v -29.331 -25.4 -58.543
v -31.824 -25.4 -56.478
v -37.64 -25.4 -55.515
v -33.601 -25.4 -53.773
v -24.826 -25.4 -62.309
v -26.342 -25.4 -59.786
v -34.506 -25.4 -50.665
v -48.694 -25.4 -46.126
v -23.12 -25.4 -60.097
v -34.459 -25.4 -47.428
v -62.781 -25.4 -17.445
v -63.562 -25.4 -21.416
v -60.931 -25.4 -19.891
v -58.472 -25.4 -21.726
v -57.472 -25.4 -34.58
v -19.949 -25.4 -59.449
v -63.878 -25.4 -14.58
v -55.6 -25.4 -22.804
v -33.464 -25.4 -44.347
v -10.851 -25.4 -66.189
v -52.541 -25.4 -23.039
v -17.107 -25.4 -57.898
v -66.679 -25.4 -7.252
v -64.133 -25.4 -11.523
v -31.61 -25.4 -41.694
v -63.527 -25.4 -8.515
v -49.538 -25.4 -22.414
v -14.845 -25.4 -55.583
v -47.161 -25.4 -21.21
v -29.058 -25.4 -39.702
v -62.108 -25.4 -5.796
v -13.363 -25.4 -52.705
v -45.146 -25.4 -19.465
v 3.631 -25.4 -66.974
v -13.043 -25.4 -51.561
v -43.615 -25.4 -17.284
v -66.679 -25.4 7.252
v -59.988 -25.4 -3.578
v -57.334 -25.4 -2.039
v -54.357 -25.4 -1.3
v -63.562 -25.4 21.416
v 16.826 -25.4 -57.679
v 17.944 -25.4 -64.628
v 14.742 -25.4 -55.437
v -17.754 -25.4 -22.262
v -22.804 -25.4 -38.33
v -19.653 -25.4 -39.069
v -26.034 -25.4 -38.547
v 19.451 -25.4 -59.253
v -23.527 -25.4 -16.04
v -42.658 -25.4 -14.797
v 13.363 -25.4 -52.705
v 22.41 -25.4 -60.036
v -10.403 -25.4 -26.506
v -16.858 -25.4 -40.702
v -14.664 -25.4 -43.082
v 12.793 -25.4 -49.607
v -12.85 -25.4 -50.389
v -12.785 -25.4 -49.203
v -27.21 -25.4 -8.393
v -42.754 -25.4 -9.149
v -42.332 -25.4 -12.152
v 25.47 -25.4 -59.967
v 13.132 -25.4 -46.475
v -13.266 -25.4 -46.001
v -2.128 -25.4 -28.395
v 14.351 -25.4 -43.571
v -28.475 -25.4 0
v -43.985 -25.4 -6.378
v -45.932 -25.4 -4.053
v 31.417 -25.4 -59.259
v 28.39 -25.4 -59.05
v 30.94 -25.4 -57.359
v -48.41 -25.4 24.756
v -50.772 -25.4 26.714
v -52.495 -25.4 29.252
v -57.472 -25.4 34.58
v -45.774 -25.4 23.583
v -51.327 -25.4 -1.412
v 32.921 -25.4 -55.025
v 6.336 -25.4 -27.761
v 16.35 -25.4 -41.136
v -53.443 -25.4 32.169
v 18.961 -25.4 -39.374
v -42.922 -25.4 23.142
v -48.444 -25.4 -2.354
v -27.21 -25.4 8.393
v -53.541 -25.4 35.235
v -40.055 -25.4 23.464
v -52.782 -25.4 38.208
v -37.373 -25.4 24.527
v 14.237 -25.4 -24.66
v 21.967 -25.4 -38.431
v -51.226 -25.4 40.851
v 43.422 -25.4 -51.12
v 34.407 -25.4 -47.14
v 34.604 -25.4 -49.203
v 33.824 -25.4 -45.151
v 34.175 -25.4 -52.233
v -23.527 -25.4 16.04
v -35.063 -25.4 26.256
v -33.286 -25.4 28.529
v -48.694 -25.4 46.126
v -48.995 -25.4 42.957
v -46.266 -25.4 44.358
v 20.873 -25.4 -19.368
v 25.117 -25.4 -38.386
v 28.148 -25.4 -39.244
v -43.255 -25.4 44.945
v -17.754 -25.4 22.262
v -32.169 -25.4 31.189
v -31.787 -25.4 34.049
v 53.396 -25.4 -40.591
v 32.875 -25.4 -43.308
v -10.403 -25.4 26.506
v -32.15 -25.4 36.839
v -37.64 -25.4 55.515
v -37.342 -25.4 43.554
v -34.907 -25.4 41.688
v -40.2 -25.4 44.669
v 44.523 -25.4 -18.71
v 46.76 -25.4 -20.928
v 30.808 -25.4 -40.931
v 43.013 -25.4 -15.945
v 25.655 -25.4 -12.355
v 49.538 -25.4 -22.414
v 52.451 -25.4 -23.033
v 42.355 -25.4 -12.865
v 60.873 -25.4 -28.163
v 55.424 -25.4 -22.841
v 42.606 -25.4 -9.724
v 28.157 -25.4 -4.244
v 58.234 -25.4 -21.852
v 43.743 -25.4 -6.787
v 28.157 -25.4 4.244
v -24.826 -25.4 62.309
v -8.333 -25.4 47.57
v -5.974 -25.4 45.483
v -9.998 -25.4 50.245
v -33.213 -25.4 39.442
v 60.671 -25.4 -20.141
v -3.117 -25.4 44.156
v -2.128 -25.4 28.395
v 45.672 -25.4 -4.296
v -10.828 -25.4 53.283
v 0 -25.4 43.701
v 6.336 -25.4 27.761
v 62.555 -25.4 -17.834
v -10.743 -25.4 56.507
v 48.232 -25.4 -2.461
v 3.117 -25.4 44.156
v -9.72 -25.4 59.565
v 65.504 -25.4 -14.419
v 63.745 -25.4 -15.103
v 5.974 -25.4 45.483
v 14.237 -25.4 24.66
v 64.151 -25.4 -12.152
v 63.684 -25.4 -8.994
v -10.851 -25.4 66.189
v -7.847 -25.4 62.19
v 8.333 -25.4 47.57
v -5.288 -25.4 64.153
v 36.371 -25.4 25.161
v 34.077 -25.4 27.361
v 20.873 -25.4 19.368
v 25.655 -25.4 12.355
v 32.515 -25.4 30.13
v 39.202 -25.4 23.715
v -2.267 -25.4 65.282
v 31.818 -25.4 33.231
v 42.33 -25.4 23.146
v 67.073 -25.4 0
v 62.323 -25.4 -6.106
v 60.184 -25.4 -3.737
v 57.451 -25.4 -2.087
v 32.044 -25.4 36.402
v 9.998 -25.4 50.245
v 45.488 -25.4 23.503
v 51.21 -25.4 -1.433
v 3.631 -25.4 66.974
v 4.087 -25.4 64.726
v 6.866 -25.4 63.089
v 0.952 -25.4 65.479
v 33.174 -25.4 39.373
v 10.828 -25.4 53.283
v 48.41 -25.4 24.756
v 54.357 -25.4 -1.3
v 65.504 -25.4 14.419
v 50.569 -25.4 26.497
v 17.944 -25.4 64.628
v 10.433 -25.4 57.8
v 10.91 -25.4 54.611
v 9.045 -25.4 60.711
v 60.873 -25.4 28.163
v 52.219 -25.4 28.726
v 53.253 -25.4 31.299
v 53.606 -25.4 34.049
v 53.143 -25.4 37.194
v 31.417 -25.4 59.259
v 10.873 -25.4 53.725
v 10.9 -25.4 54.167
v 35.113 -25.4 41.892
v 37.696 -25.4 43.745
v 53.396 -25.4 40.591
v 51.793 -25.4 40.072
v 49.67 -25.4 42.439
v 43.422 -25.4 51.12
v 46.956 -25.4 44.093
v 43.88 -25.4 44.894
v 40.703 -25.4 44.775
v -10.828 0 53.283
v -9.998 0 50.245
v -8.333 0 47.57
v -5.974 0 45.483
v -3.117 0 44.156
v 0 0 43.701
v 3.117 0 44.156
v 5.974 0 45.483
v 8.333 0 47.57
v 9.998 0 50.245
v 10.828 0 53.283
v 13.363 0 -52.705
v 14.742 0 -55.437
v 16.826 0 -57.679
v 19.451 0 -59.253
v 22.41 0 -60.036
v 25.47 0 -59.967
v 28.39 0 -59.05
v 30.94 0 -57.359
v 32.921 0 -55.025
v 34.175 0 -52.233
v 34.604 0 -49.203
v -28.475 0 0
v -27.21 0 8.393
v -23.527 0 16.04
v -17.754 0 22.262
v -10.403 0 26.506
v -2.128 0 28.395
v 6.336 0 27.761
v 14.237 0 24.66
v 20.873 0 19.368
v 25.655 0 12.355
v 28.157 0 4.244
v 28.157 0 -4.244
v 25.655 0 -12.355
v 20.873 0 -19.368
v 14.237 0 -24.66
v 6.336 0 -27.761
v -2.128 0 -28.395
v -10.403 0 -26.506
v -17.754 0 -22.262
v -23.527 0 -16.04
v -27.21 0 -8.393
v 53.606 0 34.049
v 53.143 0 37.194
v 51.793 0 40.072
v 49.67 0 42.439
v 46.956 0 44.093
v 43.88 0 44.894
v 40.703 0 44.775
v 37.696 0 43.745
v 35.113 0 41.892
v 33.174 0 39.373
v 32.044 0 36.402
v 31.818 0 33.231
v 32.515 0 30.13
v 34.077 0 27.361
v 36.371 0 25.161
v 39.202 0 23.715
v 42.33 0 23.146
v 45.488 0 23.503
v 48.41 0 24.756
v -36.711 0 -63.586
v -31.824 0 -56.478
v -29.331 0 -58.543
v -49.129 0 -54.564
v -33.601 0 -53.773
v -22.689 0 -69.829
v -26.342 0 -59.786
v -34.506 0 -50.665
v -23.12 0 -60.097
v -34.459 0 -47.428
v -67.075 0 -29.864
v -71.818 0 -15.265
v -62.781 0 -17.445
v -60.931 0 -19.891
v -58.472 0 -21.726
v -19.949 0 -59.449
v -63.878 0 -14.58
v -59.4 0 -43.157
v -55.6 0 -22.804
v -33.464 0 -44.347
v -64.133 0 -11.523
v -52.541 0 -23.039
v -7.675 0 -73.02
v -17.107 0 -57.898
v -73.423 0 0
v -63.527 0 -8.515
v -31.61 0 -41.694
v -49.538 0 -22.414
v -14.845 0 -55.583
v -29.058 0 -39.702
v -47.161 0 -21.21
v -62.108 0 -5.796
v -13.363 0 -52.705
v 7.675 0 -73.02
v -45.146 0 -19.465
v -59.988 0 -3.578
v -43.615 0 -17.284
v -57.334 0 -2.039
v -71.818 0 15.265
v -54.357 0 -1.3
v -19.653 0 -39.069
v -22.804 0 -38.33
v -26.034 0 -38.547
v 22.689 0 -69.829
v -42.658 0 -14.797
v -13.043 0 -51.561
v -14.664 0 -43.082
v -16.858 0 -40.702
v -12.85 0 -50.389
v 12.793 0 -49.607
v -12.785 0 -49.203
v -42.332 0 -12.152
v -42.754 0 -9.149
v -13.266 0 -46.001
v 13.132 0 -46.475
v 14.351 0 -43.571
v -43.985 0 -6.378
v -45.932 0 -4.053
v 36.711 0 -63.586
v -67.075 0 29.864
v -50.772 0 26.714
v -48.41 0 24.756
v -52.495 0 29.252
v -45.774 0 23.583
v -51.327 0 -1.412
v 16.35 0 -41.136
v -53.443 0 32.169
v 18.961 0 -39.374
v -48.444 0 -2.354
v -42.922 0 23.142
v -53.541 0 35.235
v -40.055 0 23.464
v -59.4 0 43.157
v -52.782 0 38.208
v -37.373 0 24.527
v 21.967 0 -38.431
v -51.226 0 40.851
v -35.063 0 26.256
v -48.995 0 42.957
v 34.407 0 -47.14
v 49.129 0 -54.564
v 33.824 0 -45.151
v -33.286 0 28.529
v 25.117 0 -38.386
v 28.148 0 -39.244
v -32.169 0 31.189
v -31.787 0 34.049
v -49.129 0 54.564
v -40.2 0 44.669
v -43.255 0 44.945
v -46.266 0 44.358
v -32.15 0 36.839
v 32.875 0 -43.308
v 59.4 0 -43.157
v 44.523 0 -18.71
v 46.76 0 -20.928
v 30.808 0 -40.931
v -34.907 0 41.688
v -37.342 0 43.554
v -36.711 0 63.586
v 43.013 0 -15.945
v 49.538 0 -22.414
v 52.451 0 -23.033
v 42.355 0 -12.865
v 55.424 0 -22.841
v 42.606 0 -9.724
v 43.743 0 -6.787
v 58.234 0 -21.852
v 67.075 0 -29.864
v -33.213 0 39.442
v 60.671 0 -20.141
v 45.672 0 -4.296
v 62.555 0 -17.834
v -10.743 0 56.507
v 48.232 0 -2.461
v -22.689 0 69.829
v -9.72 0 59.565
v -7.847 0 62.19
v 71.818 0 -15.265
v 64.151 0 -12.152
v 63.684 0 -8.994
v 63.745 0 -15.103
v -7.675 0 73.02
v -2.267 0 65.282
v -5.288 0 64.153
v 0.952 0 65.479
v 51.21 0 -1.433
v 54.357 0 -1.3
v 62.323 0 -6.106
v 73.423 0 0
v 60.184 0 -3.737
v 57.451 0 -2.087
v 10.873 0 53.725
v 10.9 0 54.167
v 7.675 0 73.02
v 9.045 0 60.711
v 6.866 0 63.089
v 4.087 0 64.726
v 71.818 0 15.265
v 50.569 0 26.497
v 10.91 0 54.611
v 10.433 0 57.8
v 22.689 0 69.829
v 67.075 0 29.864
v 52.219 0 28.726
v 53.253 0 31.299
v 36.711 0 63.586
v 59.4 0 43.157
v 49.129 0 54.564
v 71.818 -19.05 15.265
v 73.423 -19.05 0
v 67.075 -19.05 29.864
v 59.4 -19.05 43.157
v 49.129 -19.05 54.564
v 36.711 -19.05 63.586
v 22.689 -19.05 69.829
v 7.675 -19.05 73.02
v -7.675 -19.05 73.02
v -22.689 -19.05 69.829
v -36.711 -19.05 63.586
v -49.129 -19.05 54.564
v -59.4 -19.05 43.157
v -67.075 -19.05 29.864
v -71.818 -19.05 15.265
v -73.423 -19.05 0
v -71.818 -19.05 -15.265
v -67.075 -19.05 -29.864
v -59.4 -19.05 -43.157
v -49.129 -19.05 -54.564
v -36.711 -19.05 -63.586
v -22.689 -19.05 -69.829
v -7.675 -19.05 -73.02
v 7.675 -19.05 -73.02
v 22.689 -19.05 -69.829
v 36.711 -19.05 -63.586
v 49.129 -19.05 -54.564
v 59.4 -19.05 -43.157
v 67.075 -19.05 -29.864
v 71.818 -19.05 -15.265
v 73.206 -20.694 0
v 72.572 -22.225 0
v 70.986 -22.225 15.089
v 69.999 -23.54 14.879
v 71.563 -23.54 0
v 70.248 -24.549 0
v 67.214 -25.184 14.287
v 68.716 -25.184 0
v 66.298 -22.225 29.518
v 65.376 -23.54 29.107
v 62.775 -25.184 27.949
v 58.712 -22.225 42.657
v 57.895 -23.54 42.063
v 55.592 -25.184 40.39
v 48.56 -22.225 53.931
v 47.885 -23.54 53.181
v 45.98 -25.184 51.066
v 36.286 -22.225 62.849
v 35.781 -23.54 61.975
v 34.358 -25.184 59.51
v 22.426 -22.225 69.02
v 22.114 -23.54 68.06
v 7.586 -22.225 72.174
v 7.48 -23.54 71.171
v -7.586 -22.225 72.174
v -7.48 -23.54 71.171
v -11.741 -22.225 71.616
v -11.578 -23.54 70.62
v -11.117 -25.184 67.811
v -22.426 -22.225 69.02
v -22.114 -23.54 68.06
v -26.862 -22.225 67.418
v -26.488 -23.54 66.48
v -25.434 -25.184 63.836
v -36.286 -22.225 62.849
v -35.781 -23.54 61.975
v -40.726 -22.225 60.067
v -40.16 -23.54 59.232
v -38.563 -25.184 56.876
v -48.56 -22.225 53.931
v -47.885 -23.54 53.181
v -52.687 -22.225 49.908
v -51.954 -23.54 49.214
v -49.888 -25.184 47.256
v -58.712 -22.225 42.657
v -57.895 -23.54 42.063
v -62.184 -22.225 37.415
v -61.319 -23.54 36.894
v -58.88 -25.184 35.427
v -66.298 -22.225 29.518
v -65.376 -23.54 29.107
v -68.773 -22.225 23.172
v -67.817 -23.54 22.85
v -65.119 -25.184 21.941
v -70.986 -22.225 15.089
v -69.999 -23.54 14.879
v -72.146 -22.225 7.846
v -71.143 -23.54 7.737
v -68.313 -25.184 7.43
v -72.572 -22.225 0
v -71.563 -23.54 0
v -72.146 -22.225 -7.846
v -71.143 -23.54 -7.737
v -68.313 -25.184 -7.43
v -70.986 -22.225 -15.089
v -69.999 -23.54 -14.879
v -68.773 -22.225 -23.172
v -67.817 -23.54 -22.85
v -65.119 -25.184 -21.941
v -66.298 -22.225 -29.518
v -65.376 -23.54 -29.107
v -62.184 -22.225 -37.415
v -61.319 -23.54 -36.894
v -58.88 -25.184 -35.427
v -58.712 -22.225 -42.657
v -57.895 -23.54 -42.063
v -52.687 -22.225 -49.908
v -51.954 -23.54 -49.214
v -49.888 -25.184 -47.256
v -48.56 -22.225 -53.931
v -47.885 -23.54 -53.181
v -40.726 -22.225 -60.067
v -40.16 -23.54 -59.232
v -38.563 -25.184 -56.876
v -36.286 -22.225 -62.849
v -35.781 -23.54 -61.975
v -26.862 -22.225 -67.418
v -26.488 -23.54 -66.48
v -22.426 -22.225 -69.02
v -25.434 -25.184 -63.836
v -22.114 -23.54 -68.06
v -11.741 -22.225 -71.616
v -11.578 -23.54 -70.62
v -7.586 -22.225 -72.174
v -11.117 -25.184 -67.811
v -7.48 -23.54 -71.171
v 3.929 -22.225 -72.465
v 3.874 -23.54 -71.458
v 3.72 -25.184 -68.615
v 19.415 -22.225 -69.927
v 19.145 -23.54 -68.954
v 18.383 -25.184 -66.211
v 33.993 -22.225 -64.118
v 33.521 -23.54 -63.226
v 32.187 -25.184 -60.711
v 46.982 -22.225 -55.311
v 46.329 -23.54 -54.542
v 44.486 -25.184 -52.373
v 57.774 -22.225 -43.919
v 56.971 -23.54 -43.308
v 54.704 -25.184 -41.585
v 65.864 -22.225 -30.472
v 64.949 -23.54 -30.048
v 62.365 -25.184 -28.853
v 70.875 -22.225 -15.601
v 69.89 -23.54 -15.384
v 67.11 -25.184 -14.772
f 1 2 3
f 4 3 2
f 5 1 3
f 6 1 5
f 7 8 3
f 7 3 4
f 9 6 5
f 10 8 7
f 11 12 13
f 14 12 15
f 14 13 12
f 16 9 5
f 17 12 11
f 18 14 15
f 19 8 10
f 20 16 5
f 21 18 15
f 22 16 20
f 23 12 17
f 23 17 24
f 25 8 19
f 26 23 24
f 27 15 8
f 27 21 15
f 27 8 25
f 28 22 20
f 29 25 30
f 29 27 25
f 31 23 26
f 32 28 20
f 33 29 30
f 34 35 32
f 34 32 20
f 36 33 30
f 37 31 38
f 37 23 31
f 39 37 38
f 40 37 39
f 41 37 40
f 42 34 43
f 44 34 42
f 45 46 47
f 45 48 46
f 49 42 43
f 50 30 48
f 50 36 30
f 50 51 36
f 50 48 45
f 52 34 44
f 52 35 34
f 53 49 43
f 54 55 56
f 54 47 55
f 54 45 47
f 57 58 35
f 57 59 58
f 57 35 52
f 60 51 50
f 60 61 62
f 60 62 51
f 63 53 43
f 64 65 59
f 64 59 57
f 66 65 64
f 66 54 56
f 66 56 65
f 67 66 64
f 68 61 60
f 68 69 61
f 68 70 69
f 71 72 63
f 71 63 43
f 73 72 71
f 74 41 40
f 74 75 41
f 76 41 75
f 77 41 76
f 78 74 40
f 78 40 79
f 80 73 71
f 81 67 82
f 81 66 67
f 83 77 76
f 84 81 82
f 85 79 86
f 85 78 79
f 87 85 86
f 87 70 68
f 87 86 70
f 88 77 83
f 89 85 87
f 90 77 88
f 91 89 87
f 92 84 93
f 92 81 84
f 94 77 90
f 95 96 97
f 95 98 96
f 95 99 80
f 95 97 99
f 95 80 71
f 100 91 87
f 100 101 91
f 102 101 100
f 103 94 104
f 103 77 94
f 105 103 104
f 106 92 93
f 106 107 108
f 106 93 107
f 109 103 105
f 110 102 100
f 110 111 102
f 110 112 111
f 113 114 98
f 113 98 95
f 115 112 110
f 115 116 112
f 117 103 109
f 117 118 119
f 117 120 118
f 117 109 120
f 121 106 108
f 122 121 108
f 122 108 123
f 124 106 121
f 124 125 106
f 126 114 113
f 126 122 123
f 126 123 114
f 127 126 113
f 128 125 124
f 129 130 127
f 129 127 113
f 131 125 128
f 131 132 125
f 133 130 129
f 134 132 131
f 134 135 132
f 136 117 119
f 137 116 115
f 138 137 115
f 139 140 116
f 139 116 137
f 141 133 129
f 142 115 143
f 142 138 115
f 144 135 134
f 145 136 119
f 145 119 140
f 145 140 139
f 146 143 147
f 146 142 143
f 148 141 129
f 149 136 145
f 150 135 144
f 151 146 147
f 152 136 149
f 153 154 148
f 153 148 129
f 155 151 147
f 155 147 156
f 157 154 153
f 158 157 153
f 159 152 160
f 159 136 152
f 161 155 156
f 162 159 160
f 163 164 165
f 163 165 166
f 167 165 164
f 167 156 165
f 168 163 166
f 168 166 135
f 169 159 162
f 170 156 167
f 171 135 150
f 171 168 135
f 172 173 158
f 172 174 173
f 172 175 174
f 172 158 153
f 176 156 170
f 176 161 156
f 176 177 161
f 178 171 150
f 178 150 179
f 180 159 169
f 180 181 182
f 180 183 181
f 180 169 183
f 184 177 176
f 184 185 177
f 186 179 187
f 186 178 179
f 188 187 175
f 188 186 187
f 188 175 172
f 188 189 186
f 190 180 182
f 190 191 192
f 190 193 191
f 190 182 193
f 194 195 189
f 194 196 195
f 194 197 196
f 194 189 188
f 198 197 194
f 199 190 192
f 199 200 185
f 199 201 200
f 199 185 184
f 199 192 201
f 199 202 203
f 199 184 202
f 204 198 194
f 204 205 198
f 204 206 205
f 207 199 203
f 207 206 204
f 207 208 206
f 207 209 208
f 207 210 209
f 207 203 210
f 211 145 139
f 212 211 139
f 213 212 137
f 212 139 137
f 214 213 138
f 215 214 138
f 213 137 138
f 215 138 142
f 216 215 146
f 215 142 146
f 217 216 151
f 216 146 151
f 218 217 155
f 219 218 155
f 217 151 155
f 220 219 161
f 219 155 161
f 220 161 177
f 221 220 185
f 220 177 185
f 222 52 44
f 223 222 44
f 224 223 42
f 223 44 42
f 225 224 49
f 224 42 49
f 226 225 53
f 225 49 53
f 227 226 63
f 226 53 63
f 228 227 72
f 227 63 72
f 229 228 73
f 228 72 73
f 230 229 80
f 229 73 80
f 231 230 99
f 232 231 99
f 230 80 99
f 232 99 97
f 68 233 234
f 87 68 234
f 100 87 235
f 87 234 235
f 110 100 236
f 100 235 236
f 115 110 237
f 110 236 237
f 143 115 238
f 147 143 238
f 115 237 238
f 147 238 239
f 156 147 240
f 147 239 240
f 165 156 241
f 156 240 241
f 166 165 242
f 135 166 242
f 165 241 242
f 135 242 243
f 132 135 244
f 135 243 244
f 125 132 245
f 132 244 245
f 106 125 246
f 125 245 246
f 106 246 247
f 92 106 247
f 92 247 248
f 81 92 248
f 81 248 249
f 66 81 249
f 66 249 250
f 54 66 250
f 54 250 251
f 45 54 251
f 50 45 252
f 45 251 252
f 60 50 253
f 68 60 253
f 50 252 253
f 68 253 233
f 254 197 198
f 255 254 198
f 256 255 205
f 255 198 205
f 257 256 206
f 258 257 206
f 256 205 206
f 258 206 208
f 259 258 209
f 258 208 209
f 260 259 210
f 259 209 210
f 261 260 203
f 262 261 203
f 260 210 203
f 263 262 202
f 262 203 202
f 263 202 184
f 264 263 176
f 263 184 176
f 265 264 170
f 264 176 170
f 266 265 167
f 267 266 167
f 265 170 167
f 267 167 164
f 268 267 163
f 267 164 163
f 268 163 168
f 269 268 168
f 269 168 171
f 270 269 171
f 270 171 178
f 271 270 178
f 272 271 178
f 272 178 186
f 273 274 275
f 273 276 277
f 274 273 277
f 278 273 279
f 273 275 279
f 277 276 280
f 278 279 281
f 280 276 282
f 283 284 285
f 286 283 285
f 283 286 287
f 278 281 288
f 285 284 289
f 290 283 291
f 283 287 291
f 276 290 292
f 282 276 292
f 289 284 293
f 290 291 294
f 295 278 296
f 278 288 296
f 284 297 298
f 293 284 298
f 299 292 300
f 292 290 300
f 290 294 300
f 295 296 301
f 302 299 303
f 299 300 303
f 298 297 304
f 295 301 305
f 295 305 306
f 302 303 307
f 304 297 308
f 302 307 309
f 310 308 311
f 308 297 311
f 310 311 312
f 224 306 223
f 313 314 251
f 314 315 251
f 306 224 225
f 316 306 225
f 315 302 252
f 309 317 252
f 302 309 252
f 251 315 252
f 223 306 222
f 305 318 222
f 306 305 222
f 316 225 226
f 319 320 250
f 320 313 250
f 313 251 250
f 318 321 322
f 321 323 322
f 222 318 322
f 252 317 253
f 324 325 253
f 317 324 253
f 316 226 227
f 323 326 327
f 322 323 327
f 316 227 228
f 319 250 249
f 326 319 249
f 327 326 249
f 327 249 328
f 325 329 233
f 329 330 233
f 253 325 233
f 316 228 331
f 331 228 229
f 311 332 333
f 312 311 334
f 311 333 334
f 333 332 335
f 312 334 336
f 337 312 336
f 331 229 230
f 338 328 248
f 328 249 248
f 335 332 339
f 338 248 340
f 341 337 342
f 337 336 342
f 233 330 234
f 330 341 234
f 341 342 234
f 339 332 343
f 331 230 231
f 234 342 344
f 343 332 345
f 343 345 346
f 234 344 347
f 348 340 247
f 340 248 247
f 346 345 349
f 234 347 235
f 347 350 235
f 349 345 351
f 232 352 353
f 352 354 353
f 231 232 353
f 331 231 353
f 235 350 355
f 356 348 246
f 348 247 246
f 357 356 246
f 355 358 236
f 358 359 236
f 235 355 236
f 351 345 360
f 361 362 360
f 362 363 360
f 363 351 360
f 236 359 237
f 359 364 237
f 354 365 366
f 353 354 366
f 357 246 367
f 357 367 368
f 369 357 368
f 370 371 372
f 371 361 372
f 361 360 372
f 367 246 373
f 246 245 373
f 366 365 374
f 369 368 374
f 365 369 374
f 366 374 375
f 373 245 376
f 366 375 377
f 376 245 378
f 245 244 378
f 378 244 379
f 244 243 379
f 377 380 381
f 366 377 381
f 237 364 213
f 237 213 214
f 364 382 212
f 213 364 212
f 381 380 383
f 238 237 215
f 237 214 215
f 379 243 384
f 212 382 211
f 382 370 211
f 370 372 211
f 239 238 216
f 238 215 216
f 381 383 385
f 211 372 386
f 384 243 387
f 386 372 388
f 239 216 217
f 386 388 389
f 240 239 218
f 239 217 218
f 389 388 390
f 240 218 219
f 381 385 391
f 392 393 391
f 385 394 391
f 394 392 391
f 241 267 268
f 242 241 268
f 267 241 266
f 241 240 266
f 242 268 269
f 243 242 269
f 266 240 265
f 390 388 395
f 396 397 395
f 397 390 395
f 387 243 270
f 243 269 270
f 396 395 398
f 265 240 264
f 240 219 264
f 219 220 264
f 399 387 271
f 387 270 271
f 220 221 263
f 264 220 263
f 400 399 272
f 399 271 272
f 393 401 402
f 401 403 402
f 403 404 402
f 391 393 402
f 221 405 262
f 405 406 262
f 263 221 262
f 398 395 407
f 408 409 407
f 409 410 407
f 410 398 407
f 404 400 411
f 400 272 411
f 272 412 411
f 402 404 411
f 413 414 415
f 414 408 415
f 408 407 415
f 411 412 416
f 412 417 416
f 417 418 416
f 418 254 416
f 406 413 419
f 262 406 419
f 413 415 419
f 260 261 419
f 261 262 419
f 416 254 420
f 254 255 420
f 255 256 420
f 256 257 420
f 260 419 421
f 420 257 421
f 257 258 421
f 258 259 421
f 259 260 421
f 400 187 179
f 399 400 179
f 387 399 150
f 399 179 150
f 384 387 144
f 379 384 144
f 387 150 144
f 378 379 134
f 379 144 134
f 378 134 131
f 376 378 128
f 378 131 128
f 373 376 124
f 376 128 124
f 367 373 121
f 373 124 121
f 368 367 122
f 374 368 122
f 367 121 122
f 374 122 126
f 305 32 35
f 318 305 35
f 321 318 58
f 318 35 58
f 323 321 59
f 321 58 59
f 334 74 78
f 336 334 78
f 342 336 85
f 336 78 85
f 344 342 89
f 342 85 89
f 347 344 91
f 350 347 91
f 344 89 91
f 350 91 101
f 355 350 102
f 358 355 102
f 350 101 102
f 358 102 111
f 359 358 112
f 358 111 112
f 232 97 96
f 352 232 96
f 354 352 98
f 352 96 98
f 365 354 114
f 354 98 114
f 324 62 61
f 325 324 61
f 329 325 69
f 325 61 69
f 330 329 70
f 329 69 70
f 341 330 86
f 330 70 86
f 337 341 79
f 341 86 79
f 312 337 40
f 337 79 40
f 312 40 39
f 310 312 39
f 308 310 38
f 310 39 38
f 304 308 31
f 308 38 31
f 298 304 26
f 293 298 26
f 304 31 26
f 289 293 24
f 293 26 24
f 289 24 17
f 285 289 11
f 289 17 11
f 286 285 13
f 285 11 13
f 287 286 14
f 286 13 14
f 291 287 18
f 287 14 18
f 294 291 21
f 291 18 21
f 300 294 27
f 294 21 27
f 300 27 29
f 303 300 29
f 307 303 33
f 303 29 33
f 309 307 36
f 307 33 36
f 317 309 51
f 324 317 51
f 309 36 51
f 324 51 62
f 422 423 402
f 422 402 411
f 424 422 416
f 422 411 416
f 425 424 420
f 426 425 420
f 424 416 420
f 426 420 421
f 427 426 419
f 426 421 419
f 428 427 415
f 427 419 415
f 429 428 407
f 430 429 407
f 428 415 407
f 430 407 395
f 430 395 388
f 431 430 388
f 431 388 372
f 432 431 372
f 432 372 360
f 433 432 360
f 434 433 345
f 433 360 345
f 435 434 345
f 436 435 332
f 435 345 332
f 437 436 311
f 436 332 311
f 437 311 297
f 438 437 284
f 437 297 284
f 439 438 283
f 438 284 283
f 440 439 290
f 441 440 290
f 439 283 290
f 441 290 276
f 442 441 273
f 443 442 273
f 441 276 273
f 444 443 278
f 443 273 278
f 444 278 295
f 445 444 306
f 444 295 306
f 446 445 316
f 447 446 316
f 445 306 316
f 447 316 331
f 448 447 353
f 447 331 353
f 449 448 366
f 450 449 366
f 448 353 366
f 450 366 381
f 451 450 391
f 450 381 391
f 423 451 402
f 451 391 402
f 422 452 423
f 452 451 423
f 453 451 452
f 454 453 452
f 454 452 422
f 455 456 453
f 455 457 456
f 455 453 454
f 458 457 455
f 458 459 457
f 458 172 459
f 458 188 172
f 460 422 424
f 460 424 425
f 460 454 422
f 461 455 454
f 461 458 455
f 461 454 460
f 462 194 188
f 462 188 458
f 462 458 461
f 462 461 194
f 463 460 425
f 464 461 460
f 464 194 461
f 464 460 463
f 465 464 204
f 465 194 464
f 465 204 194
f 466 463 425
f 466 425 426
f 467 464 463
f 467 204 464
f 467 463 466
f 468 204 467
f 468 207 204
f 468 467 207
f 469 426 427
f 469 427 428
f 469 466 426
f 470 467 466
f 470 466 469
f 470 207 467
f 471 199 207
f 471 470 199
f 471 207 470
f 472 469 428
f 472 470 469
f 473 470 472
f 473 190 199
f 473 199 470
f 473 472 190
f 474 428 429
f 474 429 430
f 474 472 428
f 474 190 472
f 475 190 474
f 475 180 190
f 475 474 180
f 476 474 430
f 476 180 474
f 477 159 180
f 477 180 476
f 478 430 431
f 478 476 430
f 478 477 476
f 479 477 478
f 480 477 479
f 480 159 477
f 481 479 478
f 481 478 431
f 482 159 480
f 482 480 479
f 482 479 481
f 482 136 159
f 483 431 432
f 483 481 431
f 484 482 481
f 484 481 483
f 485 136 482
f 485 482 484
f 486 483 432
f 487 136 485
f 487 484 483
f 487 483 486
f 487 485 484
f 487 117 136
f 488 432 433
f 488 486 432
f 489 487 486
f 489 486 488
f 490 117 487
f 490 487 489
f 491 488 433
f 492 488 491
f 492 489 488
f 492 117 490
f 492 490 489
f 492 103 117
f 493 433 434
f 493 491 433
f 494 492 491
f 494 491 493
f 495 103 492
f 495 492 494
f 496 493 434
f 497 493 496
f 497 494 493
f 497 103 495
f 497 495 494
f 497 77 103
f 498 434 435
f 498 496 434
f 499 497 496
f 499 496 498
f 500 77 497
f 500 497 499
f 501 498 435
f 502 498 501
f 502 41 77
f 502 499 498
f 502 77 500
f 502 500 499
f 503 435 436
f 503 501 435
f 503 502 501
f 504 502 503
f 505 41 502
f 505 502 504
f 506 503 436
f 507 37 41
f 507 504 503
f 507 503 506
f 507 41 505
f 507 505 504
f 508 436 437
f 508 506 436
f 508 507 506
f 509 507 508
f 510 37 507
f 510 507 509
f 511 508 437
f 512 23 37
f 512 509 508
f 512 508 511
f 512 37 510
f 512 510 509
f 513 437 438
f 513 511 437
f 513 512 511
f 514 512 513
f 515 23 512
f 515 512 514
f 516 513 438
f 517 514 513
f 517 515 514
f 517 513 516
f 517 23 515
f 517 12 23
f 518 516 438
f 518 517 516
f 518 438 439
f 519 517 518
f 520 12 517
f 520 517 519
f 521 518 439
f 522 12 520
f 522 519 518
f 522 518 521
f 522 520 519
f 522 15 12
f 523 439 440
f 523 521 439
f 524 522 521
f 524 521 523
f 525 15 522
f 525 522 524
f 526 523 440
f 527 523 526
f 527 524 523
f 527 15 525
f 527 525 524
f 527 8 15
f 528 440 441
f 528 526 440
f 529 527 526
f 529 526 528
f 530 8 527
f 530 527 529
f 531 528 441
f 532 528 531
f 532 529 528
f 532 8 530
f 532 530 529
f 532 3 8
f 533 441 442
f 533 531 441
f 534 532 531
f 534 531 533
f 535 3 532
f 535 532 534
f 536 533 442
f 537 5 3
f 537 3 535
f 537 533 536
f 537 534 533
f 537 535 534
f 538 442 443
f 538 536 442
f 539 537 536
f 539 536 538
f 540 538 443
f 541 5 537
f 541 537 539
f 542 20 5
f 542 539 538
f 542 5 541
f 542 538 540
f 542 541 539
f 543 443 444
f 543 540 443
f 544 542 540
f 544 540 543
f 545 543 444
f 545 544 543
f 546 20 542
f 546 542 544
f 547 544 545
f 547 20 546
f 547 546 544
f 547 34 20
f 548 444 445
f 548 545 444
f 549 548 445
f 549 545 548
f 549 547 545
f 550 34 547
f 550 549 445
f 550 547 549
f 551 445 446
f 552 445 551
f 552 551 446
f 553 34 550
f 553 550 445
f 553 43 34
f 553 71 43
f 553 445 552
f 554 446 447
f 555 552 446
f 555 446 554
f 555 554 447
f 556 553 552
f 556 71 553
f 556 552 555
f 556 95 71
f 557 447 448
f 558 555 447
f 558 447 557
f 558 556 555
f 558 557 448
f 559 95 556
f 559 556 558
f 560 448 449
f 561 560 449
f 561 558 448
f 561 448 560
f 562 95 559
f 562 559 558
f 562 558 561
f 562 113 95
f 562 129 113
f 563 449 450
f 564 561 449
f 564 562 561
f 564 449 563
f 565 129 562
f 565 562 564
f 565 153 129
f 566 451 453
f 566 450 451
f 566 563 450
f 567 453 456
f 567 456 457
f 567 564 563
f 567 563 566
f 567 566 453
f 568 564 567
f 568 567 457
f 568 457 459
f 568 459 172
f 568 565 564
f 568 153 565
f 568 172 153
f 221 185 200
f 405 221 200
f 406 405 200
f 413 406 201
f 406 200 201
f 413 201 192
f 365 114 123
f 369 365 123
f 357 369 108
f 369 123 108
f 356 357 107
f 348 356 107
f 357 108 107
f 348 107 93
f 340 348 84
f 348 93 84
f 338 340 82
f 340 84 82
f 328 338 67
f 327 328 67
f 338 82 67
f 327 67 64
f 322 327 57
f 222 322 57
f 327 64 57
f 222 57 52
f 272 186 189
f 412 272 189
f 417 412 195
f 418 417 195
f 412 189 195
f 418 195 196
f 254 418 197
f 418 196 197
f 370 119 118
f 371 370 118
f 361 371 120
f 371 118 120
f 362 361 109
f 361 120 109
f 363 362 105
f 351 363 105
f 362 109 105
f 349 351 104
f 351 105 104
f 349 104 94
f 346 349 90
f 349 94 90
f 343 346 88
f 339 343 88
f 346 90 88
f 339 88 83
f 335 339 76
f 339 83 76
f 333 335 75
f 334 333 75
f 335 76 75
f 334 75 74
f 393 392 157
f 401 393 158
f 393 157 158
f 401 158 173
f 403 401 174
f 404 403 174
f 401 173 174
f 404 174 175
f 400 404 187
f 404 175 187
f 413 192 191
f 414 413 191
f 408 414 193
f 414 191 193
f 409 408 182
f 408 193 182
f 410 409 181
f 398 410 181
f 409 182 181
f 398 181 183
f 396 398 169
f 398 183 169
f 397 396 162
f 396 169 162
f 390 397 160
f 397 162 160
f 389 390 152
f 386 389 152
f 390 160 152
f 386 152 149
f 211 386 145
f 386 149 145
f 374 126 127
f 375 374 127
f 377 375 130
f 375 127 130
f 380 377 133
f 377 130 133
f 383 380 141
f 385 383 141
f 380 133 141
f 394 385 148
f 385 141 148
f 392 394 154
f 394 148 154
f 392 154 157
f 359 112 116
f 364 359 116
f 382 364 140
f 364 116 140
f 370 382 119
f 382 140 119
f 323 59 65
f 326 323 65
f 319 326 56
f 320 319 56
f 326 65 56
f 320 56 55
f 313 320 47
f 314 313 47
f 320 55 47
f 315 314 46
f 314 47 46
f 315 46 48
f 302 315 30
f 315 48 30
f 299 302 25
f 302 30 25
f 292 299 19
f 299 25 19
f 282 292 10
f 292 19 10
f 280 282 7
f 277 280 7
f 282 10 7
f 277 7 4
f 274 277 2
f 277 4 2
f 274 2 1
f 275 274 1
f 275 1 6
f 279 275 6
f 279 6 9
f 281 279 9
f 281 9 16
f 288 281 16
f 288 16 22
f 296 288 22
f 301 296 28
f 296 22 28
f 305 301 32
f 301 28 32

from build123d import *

# Parameters (mm, degrees)
F0_R     = 73.4225499851
F1_DEPTH = 25.4
F3_R     = 6.35
F5_DEPTH = 25.4
F6_R     = 28.4745991817
F7_DEPTH = 25.4


with BuildPart() as f1:
    # F0 (on Front) → F1 (new body)
    with BuildSketch(Plane.XZ):
        Circle(F0_R)
    extrude(amount=F1_DEPTH)

    # F3
    f3_edges = [f1.edges().sort_by_distance(p)[0] for p in [
        (-73.42255, -25.4, 0),
    ]]
    fillet(f3_edges, radius=F3_R)

    # F4 (on face) → F5 (cut)
    with BuildSketch(Plane.XZ.offset(25.4)):
        with BuildLine():
            ThreePointArc((10.828438703, 53.2833849069), (10.8892176697, 53.9458802451), (10.9095024699, 54.6108484268))
            ThreePointArc((10.9095024699, 54.6108484268), (-0.6649681817, 65.5000660965), (-10.828438703, 53.2833849069))
            ThreePointArc((-10.828438703, 53.2833849069), (0, 54.3725499851), (10.828438703, 53.2833849069))
        make_face()
        with BuildLine():
            ThreePointArc((10.828438703, 53.2833849069), (0, 54.3725499851), (-10.828438703, 53.2833849069))
            ThreePointArc((-10.828438703, 53.2833849069), (0, 43.7013459569), (10.828438703, 53.2833849069))
        make_face()
        with BuildLine():
            ThreePointArc((-48.4100489141, 24.7556328141), (-42.5101713604, 33.9007304168), (-34.9072067114, 41.6876613819))
            ThreePointArc((-34.9072067114, 41.6876613819), (-51.2258730734, 40.8512705983), (-48.4100489141, 24.7556328141))
        make_face()
        with BuildLine():
            ThreePointArc((-31.7869781145, 34.049307065), (-32.5971155871, 38.1748459137), (-34.9072067114, 41.6876613819))
            ThreePointArc((-34.9072067114, 41.6876613819), (-42.5101713604, 33.9007304168), (-48.4100489141, 24.7556328141))
            ThreePointArc((-48.4100489141, 24.7556328141), (-37.3727104759, 24.5269798299), (-31.7869781145, 34.049307065))
        make_face()
        with BuildLine():
            ThreePointArc((48.4100489141, 24.7556328141), (42.5101713604, 33.9007304168), (34.9072067114, 41.6876613819))
            ThreePointArc((34.9072067114, 41.6876613819), (34.1670880954, 27.2473435317), (48.4100489141, 24.7556328141))
        make_face()
        with BuildLine():
            ThreePointArc((53.6059830542, 34.049307065), (46.8220194331, 44.1486720622), (34.9072067114, 41.6876613819))
            ThreePointArc((34.9072067114, 41.6876613819), (42.5101713604, 33.9007304168), (48.4100489141, 24.7556328141))
            ThreePointArc((48.4100489141, 24.7556328141), (52.2188078195, 28.7255369565), (53.6059830542, 34.049307065))
        make_face()
        with BuildLine():
            ThreePointArc((-49.5379049078, -22.4136157107), (-53.009316637, -12.0990306043), (-54.3570134948, -1.299721437))
            ThreePointArc((-54.3570134948, -1.299721437), (-63.8776189051, -14.5796496747), (-49.5379049078, -22.4136157107))
        make_face()
        with BuildLine():
            ThreePointArc((-42.3321379694, -12.1520569961), (-45.9324312127, -4.0531246824), (-54.3570134948, -1.299721437))
            ThreePointArc((-54.3570134948, -1.299721437), (-53.009316637, -12.0990306043), (-49.5379049078, -22.4136157107))
            ThreePointArc((-49.5379049078, -22.4136157107), (-44.3135063658, -18.421480104), (-42.3321379694, -12.1520569961))
        make_face()
        with BuildLine():
            ThreePointArc((49.5379049078, -22.4136157107), (53.009316637, -12.0990306043), (54.3570134948, -1.299721437))
            ThreePointArc((54.3570134948, -1.299721437), (42.6056619733, -9.7244643175), (49.5379049078, -22.4136157107))
        make_face()
        with BuildLine():
            ThreePointArc((64.1511429091, -12.1520569961), (61.340572753, -4.8428477695), (54.3570134948, -1.299721437))
            ThreePointArc((54.3570134948, -1.299721437), (53.009316637, -12.0990306043), (49.5379049078, -22.4136157107))
            ThreePointArc((49.5379049078, -22.4136157107), (59.5110635472, -21.0801910696), (64.1511429091, -12.1520569961))
        make_face()
        with BuildLine():
            ThreePointArc((-13.3627081169, -52.7049544509), (-23.5913652929, -48.9879748051), (-32.8748804356, -43.3083875044))
            ThreePointArc((-32.8748804356, -43.3083875044), (-28.4282148354, -59.031796372), (-13.3627081169, -52.7049544509))
        make_face()
        with BuildLine():
            ThreePointArc((-12.7852566419, -49.2026742823), (-20.6233841848, -38.7344413752), (-32.8748804356, -43.3083875044))
            ThreePointArc((-32.8748804356, -43.3083875044), (-23.5913652929, -48.9879748051), (-13.3627081169, -52.7049544509))
            ThreePointArc((-13.3627081169, -52.7049544509), (-12.930587523, -50.9774571271), (-12.7852566419, -49.2026742823))
        make_face()
        with BuildLine():
            ThreePointArc((13.3627081169, -52.7049544509), (23.5913652929, -48.9879748051), (32.8748804356, -43.3083875044))
            ThreePointArc((32.8748804356, -43.3083875044), (18.9613033883, -39.3735521926), (13.3627081169, -52.7049544509))
        make_face()
        with BuildLine():
            ThreePointArc((34.6042615817, -49.2026742823), (34.1629920189, -46.1312993553), (32.8748804356, -43.3083875044))
            ThreePointArc((32.8748804356, -43.3083875044), (23.5913652929, -48.9879748051), (13.3627081169, -52.7049544509))
            ThreePointArc((13.3627081169, -52.7049544509), (25.4695419566, -59.9668458711), (34.6042615817, -49.2026742823))
        make_face()
    extrude(amount=-F5_DEPTH, mode=Mode.SUBTRACT)

    # F6 (on face) → F7 (cut)
    with BuildSketch(Plane(origin=(0, 0, 0), x_dir=(-1, 0, 0), z_dir=(0, 1, 0))):
        Circle(F6_R)
    extrude(amount=-F7_DEPTH, mode=Mode.SUBTRACT)


solid = f1.part
